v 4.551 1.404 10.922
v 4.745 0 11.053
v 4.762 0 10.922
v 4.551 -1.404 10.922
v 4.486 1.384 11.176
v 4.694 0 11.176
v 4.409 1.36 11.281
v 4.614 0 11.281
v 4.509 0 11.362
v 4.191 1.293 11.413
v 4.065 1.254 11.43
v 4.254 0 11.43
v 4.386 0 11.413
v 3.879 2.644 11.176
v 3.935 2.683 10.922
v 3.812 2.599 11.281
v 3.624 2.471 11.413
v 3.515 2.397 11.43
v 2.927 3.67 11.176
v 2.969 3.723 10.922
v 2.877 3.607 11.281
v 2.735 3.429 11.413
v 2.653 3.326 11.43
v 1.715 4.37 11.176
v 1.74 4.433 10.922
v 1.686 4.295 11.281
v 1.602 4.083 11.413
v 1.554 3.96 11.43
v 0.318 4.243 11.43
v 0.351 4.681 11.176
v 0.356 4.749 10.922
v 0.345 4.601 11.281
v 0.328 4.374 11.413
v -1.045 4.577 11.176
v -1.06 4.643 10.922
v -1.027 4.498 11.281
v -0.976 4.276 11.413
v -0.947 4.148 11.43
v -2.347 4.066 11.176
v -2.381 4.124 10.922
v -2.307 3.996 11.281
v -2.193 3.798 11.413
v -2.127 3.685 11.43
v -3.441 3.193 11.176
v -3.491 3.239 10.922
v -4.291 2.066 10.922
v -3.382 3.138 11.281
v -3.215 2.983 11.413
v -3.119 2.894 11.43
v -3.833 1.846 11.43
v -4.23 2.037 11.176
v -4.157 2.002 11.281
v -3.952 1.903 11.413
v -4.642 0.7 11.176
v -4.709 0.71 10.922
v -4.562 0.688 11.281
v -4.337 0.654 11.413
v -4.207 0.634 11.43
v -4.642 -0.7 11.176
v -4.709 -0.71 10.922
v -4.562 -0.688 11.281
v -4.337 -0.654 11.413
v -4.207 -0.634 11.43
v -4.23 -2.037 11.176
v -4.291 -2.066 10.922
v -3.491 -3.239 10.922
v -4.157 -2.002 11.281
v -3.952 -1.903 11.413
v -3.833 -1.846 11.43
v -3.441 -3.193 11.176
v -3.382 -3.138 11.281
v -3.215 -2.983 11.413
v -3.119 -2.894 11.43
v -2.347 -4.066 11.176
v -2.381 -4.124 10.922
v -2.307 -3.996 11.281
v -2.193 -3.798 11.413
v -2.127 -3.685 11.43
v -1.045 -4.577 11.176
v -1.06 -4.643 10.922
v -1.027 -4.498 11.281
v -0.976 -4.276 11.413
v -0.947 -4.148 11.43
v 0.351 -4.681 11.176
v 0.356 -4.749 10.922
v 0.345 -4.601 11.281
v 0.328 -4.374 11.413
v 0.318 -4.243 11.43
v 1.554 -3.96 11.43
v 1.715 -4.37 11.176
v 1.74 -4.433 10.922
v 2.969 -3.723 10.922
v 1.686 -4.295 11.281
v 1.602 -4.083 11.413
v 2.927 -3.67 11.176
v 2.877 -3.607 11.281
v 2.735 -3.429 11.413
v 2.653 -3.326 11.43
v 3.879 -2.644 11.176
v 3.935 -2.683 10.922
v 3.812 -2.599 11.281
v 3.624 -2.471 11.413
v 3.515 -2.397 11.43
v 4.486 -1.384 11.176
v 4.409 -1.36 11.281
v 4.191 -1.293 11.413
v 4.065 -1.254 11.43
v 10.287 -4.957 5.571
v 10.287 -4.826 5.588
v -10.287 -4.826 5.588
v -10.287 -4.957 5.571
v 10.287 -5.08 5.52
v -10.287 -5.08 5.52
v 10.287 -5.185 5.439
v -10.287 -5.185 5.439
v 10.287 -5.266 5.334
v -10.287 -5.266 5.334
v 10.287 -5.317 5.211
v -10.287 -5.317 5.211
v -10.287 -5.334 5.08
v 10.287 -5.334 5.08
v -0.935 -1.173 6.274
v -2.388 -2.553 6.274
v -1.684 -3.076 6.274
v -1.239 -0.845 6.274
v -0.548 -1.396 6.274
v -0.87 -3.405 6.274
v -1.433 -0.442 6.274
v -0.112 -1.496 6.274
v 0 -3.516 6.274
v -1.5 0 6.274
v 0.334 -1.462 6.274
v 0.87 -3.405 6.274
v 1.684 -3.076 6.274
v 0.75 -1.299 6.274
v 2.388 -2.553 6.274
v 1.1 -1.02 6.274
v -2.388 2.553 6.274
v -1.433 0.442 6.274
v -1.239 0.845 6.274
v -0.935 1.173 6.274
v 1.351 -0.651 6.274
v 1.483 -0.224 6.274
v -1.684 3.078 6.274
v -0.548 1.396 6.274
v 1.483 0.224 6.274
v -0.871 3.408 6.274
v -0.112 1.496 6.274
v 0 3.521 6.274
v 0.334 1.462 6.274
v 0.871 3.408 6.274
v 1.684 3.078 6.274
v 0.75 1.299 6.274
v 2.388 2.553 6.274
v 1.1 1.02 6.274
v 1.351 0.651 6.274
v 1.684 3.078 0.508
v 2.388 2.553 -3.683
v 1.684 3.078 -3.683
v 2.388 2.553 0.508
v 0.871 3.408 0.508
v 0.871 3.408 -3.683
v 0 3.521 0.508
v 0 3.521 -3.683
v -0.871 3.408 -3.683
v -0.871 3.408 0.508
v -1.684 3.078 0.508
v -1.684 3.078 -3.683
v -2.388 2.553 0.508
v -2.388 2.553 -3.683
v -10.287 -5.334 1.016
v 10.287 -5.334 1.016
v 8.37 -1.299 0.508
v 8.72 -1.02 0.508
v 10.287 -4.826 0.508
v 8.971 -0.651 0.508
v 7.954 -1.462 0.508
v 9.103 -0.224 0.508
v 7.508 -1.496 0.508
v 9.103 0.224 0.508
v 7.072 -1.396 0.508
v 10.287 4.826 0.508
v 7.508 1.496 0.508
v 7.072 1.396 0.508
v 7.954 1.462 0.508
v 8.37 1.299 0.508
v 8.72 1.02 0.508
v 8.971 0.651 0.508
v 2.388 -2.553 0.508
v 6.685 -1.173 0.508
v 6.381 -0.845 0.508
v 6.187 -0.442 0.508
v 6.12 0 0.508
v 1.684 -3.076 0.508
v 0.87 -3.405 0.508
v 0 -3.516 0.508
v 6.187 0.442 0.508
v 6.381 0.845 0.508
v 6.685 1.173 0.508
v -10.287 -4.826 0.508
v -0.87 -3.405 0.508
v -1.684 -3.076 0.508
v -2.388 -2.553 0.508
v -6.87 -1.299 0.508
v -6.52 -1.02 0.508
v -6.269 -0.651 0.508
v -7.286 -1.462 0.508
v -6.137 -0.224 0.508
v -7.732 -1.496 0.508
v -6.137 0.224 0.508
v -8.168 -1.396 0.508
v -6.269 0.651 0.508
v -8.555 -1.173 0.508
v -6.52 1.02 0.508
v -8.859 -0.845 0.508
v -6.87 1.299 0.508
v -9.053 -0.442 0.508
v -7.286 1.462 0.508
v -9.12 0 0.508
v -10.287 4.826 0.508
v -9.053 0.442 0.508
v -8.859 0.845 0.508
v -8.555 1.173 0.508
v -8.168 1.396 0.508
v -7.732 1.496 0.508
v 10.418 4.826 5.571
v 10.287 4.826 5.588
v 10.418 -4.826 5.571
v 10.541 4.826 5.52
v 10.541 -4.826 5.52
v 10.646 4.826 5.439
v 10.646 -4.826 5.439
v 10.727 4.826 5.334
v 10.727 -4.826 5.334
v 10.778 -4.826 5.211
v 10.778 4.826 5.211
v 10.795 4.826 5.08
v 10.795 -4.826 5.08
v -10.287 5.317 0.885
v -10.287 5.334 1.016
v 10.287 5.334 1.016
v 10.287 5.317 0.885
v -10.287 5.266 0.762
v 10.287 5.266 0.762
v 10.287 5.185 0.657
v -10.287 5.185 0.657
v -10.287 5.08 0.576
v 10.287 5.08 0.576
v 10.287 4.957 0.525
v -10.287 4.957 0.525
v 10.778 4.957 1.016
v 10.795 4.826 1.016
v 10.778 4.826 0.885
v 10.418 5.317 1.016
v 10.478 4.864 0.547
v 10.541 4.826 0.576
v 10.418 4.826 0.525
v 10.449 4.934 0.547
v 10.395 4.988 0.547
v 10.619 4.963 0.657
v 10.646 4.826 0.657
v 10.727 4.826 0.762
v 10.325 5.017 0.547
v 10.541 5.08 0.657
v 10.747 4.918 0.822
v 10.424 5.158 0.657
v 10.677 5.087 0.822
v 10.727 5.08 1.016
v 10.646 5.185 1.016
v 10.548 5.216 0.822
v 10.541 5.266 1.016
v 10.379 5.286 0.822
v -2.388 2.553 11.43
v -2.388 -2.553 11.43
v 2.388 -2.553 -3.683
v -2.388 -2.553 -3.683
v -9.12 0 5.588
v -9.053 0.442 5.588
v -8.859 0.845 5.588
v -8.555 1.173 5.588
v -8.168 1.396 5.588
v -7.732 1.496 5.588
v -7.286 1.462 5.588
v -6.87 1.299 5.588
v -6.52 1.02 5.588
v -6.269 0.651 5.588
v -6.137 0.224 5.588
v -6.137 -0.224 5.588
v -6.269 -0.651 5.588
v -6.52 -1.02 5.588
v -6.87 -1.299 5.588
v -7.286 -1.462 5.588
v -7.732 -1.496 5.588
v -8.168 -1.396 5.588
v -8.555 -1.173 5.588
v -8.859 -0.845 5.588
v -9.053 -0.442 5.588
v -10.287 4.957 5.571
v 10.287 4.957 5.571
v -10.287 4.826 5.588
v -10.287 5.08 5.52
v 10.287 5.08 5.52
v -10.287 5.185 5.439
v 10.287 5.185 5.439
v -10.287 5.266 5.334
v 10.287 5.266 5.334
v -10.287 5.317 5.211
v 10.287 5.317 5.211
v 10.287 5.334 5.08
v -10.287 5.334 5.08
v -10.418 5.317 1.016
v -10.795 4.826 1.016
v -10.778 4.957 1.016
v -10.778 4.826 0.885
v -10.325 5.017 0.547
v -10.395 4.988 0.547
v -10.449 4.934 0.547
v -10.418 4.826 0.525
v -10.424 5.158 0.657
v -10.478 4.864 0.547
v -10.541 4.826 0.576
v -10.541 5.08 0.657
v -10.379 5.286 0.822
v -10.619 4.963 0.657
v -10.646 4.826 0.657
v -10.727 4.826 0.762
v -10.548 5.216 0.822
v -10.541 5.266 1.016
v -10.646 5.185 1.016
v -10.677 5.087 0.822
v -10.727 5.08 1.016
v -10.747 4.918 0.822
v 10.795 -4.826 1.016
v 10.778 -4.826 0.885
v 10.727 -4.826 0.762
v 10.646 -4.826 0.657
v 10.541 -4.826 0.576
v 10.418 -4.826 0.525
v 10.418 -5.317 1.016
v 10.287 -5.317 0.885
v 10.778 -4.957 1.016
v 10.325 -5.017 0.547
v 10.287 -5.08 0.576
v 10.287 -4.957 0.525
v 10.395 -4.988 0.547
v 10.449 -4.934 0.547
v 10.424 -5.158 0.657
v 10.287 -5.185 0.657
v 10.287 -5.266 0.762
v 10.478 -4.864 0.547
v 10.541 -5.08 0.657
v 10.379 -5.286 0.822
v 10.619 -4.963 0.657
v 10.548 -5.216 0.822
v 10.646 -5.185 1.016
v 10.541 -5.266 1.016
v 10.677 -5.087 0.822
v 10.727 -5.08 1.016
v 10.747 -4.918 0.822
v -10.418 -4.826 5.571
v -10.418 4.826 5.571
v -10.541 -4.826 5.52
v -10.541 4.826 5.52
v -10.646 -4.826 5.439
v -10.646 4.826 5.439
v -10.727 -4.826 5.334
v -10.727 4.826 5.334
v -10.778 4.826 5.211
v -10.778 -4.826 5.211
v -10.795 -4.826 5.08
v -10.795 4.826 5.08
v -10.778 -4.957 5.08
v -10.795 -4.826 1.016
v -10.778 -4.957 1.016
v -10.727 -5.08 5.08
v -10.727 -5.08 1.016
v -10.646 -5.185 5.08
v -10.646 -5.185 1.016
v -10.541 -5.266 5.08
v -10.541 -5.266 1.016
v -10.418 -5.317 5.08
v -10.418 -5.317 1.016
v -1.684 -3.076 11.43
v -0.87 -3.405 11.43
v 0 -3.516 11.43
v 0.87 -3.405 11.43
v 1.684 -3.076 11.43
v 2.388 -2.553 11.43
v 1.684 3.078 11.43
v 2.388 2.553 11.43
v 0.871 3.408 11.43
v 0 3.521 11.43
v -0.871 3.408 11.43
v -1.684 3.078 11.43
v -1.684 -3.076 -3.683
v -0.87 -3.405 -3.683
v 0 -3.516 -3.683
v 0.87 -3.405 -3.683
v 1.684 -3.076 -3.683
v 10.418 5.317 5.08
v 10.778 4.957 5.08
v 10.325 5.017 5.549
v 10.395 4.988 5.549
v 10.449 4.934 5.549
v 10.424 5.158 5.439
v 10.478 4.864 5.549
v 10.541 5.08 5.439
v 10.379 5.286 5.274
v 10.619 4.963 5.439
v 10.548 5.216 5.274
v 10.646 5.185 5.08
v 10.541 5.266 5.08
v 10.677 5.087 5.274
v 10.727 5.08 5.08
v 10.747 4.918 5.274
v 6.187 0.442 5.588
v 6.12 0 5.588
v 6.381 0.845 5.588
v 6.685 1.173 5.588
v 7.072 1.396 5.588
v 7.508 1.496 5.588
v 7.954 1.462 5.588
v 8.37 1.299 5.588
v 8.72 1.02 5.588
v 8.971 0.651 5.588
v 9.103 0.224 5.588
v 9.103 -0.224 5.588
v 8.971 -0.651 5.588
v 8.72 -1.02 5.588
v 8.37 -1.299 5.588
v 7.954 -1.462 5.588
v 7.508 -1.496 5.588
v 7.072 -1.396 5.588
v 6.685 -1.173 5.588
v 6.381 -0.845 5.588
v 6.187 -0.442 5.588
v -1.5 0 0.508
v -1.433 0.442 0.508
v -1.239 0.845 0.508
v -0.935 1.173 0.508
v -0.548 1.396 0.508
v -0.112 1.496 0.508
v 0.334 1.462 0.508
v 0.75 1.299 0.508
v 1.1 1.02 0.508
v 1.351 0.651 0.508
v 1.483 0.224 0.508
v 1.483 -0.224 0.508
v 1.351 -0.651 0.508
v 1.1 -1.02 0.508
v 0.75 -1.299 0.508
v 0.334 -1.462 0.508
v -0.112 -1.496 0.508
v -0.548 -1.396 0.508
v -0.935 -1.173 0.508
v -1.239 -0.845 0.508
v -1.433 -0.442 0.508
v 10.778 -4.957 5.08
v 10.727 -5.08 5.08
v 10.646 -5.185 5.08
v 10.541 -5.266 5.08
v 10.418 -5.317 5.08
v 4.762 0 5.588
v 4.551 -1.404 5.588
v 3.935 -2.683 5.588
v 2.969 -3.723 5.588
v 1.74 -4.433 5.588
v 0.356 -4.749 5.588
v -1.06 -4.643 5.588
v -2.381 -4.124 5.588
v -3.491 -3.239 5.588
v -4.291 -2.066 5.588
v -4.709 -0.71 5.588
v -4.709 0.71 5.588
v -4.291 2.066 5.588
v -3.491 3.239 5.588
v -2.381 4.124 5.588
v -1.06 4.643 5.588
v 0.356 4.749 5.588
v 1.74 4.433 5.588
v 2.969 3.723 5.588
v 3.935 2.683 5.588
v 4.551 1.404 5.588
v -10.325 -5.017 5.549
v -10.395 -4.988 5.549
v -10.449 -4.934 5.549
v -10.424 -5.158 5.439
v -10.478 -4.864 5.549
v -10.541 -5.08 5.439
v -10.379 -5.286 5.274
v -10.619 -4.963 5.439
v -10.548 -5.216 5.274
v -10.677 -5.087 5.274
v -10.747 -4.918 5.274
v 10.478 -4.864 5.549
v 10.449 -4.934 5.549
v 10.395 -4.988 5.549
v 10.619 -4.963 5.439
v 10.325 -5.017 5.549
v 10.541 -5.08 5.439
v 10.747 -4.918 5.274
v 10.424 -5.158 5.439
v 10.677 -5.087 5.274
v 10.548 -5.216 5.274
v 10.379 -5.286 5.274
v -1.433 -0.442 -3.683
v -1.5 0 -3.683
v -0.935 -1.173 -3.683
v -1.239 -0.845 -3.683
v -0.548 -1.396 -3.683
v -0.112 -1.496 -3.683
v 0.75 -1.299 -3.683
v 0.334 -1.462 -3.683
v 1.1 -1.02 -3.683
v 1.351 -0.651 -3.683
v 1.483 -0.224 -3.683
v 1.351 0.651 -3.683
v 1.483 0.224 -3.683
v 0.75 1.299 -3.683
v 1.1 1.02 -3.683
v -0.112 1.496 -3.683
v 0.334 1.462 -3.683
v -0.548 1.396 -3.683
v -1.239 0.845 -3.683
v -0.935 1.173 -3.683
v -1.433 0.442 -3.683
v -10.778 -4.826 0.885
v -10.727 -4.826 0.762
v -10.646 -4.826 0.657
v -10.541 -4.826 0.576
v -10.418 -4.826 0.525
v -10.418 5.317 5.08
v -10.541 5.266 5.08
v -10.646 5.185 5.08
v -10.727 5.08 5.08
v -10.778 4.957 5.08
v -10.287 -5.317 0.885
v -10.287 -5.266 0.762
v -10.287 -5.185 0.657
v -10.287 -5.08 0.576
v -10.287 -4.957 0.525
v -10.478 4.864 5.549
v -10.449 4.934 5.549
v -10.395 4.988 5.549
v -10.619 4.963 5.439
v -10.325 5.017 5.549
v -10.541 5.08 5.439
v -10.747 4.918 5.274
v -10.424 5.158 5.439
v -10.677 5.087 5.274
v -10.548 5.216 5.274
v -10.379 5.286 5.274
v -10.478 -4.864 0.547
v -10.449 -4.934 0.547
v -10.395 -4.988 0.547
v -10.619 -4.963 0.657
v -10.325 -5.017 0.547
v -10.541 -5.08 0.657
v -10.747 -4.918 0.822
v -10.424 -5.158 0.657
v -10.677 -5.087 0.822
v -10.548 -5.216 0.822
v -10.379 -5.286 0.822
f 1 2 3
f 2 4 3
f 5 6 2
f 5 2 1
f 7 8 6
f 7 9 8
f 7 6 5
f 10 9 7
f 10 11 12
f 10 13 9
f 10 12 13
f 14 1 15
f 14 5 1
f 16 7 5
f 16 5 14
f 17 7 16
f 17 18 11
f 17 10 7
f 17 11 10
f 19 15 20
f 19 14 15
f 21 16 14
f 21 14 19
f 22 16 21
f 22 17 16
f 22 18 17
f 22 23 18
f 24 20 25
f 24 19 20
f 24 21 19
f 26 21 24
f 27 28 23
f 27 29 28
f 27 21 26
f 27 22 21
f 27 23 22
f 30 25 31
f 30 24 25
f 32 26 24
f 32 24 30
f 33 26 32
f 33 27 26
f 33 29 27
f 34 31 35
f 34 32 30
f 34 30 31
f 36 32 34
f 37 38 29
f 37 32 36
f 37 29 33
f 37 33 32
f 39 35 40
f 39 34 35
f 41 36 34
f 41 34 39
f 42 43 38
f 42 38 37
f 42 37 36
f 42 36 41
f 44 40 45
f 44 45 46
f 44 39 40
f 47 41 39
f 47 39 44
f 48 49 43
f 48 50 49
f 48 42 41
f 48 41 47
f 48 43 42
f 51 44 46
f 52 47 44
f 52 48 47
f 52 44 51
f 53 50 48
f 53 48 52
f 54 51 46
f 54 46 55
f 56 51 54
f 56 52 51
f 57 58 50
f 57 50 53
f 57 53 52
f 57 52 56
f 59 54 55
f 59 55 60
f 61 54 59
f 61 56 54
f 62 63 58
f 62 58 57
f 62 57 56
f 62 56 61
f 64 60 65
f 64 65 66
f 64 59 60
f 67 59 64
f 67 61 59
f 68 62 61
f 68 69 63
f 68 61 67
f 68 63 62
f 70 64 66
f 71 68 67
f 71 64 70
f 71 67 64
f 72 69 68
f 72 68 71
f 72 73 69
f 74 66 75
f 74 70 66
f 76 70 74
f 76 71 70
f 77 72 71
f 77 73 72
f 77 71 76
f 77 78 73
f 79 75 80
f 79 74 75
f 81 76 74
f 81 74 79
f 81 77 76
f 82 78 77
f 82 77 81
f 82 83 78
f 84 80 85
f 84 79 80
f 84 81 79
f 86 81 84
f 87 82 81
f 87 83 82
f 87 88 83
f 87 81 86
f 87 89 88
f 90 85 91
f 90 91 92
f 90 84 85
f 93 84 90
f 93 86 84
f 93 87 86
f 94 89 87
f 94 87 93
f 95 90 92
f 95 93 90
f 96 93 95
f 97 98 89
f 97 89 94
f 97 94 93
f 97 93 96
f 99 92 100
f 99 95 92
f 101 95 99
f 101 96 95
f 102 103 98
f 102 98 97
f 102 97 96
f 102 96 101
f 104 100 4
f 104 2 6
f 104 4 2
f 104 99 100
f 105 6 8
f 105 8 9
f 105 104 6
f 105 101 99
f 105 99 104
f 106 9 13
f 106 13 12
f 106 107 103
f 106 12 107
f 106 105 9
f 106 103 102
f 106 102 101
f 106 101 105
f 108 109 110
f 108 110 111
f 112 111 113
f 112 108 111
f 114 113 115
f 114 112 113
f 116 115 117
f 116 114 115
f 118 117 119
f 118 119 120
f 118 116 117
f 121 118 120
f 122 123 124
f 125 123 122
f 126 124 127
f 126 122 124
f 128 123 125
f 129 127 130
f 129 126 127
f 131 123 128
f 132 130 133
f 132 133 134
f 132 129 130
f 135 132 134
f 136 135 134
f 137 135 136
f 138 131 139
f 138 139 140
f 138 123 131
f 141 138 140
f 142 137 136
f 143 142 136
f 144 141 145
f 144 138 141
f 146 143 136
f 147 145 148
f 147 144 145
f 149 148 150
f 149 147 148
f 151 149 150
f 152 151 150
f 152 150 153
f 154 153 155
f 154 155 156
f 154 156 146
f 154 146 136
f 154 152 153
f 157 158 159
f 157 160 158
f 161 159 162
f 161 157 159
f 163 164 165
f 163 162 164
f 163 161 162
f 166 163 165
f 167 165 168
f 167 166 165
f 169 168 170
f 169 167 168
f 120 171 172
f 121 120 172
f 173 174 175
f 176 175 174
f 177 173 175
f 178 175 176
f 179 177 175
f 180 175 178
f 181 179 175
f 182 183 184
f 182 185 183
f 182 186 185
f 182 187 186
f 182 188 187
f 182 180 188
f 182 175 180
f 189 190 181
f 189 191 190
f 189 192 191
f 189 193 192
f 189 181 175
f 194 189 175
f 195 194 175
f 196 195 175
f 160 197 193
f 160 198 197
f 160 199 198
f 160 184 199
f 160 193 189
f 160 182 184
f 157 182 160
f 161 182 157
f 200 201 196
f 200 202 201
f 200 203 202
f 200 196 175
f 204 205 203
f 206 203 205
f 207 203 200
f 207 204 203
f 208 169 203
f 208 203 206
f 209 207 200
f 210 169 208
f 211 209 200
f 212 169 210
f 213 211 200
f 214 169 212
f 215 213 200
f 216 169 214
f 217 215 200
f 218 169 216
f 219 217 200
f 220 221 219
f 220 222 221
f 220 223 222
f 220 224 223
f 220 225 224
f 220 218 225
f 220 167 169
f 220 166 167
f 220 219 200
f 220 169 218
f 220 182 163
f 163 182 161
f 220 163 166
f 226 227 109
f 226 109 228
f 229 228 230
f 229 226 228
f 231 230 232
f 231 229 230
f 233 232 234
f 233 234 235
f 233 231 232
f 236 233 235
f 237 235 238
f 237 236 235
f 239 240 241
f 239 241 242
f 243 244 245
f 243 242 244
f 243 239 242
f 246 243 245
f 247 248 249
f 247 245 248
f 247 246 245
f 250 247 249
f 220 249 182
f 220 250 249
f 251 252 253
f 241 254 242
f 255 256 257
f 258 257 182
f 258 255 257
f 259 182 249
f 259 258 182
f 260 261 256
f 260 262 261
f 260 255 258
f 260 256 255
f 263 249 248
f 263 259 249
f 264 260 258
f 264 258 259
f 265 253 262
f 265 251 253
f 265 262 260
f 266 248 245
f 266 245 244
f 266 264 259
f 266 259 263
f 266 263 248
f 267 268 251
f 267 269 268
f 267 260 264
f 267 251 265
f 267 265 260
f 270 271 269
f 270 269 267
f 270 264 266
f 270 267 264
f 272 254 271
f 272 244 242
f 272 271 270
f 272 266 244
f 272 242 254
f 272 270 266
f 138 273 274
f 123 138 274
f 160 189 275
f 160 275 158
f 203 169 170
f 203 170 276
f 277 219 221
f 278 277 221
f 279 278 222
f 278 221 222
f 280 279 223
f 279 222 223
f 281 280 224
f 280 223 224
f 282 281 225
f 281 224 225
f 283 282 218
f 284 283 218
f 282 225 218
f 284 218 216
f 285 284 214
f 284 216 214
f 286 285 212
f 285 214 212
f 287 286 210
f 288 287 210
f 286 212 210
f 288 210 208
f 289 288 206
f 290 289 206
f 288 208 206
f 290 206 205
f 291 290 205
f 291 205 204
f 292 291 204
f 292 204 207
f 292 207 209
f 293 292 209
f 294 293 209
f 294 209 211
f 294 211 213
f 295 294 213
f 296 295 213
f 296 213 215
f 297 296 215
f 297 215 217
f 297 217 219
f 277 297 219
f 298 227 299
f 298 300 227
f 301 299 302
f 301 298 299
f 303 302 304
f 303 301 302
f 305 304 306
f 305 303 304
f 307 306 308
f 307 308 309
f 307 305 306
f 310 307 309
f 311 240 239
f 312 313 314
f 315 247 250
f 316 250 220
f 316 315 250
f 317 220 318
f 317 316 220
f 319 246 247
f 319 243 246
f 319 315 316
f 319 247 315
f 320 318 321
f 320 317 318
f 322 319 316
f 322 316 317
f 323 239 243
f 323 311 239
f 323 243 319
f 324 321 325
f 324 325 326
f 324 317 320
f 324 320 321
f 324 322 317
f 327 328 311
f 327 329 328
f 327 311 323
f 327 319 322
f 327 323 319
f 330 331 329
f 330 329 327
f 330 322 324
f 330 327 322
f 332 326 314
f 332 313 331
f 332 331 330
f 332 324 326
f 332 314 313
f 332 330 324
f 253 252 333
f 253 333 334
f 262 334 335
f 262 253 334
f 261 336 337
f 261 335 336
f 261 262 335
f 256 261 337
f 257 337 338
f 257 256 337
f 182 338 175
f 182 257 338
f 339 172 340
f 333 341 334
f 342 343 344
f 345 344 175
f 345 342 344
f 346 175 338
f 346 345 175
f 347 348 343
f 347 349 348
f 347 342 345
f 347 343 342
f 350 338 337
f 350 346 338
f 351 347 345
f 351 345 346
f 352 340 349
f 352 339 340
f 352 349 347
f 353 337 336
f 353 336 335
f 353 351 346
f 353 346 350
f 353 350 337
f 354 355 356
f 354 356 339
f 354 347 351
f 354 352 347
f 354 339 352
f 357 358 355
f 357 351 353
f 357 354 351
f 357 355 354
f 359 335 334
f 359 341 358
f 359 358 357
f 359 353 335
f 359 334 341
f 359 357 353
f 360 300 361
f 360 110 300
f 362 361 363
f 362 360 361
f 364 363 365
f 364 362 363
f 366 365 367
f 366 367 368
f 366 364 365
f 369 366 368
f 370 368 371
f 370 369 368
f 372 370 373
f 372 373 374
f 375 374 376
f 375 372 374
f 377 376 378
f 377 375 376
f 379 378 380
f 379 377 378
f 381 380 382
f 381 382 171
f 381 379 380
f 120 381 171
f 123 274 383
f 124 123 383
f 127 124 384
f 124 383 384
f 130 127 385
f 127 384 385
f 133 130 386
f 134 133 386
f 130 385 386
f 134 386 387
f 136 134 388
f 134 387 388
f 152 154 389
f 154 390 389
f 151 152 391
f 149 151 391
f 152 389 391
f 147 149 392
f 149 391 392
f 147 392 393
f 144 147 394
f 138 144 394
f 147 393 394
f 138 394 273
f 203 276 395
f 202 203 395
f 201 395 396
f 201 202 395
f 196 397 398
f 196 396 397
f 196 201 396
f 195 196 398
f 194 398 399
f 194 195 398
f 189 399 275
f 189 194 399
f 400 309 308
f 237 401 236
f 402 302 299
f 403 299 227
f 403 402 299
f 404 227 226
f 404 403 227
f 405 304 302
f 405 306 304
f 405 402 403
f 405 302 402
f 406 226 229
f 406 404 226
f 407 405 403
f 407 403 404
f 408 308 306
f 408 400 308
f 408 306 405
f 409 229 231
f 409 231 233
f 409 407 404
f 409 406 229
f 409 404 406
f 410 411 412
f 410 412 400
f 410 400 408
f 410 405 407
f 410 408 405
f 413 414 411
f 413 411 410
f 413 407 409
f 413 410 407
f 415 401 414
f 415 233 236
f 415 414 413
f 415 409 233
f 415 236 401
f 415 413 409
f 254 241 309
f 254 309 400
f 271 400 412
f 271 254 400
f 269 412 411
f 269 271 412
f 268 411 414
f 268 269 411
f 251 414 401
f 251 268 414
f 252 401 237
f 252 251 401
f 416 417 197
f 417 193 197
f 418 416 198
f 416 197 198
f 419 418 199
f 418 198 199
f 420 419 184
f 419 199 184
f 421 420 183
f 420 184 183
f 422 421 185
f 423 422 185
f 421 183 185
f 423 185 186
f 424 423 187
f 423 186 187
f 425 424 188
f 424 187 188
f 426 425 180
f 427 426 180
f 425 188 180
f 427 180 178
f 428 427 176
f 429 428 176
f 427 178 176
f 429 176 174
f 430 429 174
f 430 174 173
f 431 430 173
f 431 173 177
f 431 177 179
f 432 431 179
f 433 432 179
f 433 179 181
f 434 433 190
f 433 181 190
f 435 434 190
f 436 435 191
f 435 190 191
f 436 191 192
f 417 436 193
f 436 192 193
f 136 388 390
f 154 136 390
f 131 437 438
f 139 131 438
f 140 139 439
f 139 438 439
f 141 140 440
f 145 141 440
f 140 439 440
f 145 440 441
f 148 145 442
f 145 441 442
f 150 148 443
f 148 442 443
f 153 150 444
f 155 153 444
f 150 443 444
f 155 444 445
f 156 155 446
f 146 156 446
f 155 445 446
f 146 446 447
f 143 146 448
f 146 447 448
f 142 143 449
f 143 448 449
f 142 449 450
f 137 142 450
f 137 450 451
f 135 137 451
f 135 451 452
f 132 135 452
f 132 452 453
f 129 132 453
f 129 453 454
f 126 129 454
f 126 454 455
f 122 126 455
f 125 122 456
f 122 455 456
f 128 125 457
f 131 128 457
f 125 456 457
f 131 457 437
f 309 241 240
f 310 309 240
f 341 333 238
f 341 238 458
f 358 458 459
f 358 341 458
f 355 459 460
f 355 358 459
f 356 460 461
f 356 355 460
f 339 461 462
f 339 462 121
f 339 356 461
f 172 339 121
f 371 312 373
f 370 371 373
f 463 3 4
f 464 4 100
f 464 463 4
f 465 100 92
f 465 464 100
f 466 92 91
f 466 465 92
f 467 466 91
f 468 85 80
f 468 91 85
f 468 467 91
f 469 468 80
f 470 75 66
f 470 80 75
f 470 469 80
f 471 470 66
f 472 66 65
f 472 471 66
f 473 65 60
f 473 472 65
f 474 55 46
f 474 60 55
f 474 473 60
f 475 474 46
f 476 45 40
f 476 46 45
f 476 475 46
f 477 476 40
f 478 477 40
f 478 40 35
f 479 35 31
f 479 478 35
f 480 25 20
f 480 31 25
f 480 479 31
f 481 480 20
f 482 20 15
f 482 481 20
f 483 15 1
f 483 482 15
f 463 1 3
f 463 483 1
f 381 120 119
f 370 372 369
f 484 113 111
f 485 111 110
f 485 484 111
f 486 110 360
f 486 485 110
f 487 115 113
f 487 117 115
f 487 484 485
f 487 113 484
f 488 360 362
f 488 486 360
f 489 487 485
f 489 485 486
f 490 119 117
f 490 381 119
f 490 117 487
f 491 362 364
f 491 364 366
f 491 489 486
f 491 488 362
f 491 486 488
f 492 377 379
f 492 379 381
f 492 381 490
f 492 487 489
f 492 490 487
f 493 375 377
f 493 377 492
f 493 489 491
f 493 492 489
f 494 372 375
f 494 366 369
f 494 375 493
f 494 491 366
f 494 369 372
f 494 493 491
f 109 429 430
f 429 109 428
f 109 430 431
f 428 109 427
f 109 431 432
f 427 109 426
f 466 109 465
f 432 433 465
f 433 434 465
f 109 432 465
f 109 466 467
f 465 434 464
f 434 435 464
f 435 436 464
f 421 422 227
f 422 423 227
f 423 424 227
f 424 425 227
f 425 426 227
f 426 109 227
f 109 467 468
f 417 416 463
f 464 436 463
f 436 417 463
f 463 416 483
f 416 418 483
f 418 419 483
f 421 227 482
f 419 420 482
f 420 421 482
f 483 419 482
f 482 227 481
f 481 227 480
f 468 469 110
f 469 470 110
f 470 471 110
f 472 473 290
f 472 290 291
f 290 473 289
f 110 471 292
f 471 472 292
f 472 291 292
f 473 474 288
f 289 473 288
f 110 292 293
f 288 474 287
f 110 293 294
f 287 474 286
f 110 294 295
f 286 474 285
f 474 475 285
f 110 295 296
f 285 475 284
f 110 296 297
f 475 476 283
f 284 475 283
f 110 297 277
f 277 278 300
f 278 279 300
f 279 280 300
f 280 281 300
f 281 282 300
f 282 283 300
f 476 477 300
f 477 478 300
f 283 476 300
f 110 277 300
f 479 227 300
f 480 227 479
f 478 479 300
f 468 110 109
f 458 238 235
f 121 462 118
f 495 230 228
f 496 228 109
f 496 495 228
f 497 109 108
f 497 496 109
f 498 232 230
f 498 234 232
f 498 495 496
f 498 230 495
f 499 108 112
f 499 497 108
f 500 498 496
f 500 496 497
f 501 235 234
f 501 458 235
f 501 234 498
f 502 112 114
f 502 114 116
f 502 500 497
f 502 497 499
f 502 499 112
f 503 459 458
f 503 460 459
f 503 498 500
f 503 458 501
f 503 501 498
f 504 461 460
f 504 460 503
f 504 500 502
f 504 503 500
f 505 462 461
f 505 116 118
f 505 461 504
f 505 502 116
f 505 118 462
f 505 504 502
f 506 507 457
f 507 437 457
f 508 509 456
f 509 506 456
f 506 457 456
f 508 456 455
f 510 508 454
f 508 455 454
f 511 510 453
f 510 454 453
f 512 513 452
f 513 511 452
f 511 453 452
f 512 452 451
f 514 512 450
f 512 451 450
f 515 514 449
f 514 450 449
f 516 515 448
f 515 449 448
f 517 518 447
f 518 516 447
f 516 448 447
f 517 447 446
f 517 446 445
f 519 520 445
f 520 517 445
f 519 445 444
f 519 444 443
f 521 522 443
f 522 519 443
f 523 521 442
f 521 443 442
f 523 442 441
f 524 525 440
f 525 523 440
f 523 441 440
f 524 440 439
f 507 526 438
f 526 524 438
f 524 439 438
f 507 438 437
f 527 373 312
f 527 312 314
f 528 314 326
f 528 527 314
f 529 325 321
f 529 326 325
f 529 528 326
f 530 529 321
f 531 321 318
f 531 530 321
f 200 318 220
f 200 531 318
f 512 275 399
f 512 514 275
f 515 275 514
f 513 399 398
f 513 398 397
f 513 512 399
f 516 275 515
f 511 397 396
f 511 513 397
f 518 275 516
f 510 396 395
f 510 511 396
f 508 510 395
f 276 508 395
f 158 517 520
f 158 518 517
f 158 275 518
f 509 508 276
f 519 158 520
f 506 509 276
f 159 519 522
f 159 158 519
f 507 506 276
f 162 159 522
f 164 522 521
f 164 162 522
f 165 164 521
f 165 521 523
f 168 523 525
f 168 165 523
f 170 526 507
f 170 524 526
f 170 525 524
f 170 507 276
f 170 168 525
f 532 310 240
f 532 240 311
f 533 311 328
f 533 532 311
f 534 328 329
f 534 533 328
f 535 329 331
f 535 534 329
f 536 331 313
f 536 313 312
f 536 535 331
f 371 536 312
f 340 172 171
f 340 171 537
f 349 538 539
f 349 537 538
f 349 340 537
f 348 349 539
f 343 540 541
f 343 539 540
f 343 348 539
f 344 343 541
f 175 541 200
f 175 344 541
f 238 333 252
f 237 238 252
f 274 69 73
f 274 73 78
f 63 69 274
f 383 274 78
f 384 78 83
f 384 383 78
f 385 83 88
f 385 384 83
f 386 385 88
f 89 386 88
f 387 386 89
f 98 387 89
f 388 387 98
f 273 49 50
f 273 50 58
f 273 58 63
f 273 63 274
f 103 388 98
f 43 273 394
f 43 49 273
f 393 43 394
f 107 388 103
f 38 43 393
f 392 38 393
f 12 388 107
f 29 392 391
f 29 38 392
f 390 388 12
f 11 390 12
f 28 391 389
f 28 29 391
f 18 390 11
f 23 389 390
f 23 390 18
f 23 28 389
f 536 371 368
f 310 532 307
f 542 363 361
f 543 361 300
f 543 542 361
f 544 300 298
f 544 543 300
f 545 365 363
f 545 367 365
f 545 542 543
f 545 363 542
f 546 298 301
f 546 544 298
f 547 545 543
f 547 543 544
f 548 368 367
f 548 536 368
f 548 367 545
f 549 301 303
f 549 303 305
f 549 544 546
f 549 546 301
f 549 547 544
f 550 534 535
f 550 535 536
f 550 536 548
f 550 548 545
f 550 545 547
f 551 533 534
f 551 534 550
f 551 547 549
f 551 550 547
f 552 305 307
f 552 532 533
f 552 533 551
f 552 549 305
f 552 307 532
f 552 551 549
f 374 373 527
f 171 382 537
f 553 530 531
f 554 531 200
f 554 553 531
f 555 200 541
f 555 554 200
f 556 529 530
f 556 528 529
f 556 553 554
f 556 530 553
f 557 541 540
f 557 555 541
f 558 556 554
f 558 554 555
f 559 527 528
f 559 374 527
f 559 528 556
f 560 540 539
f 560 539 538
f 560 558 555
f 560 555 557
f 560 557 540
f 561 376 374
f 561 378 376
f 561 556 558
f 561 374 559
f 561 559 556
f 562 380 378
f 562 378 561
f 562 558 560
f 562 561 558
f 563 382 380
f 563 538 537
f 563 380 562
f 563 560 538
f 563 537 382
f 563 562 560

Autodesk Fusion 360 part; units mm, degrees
sketch "Sketch1" plane through (0, 0, 0) normal (0, 0, 1) x (1, 0, 0)
  circle A0 centre (0, 0) radius 4.7625
  dimension "d1" = 9.525
extrude "Extrude1" add sketch "Sketch1" along normal blind 11.43 makes body 1
sketch "Sketch2" plane through (0, 0, 11.43) normal (0, 0, 1) x (1, 0, 0)
  circle A0 centre (0, 0) radius 4.7625
  line L0 (-2.3876, 2.5527) -> (-2.3876, -2.5527)
  line L1 (2.3876, -2.5527) -> (2.3876, 2.5527)
  line L2 (2.3876, 2.5527) -> (-2.3876, -2.5527) construction
  line L3 (-2.3876, 2.5527) -> (2.3876, -2.5527) construction
  arc A1 (2.3876, 2.5527) -> (-2.3876, 2.5527) centre (0, 0.0915) ccw
  arc A2 (-2.3876, -2.5527) -> (2.3876, -2.5527) centre (0, -0.0771) ccw
  dimension "d4" = 5.1054
  dimension "d5" = 4.7752
  dimension "d6" = 3.429
  dimension "d7" = 3.4394
extrude "Extrude2" cut sketch "Sketch2" against normal blind 5.1562 contours L0 L1 A1 A2 bodies 1
extrude "Extrude3" cut 1 faces at (0.58, -0.1002, 0) along direction (0, 0, 1) blind 3.048 on bodies 1 bodies 1
sketch "Sketch3" plane through (0, 0, 3.048) normal (0, 0, -1) x (-1, 0, 0)
  circle A0 centre (0, 0) radius 4.7625
  line L0 (-10.795, 5.334) -> (10.795, 5.334)
  line L1 (10.795, 5.334) -> (10.795, -5.334)
  line L2 (10.795, -5.334) -> (-10.795, -5.334)
  line L3 (-10.795, -5.334) -> (-10.795, 5.334)
  line L4 (-10.795, 5.334) -> (10.795, -5.334) construction
  line L5 (10.795, 5.334) -> (-10.795, -5.334) construction
  dimension "d12" = 21.59
  dimension "d13" = 10.668
extrude "Extrude5" add sketch "Sketch3" against normal blind 2.54 bodies 1
extrude "Extrude4" add sketch "Sketch3" along normal blind 2.54 contours A0 | L0 L1 L2 L3 bodies 1
sketch "Sketch4" plane through (0, 0, 0.508) normal (0, 0, -1) x (-1, 0, 0)
  line L0 (-10.795, -5.334) -> (10.795, -5.334)
  line L1 (10.795, -5.334) -> (10.795, 5.334)
  line L2 (10.795, 5.334) -> (-10.795, 5.334)
  line L3 (-10.795, 5.334) -> (-10.795, -5.334)
  circle A0 centre (0, 0) radius 1.5
  circle A1 centre (-7.62, 0) radius 1.5
  circle A2 centre (7.62, 0) radius 1.5
  dimension "d18" = 3
  dimension "d19" = 3
  dimension "d20" = 3
extrude "Extrude6" cut sketch "Sketch4" against normal blind 13.97 contours A0 | A1 | A2 bodies 1
sketch "Sketch5" plane through (0, 0, 0.508) normal (0, 0, -1) x (-1, 0, 0)
  circle A0 centre (-7.62, 0) radius 1.5
  circle A1 centre (0, 0) radius 1.5
  circle A2 centre (7.62, 0) radius 1.5
  line L0 (-10.795, -5.334) -> (10.795, -5.334)
  line L1 (10.795, -5.334) -> (10.795, 5.334)
  line L2 (10.795, 5.334) -> (-10.795, 5.334)
  line L3 (-10.795, 5.334) -> (-10.795, -5.334)
  line L4 (-2.3876, -2.5527) -> (-2.3876, 2.5527)
  line L5 (-2.3876, 2.5527) -> (-2.3876, -2.5527)
  line L6 (2.3876, 2.5527) -> (2.3876, -2.5527)
  arc A3 (2.3876, 2.5527) -> (-2.3876, 2.5527) centre (0, 0.0915) ccw
  arc A4 (-2.3876, -2.5527) -> (2.3876, -2.5527) centre (0, -0.0771) ccw
extrude "Extrude7" add sketch "Sketch5" along normal blind 4.191 contours L4 L5 L6 A3 A4 bodies 1
fillet "Fillet1" radius 0.508 13 edges at (-10.795, -5.334, 3.048) (-10.795, 5.334, 3.048) (10.795, 5.334, 3.048) (10.795, -5.334, 3.048) (10.795, 0, 5.588) (10.795, 0, 0.508) (0, 5.334, 0.508) (0, 5.334, 5.588) (-10.795, 0, 5.588) (-10.795, 0, 0.508) (0, -5.334, 5.588) (0, -5.334, 0.508) (-4.4402, -1.7222, 11.43) on bodies 1
sketch "Sketch6" plane through (0, 0, 0.508) normal (0, 0, -1) x (-1, 0, 0)
  circle A0 centre (7.62, 0) radius 1.5
  circle A1 centre (-7.62, 0) radius 1.5
  line L0 (2.3876, 2.5527) -> (2.3876, -2.5527)
  arc A2 (-2.3876, -2.5527) -> (2.3876, -2.5527) centre (0, -0.0771) ccw
  line L1 (-2.3876, -2.5527) -> (-2.3876, 2.5527)
  arc A3 (2.3876, 2.5527) -> (-2.3876, 2.5527) centre (0, 0.0915) ccw
  line L2 (10.287, -4.826) -> (10.287, 4.826)
  line L3 (10.287, 4.826) -> (-10.287, 4.826)
  line L4 (-10.287, 4.826) -> (-10.287, -4.826)
  line L5 (-10.287, -4.826) -> (10.287, -4.826)
  circle A4 centre (0, 0.0915) radius 17.2202
  circle A5 centre (-7.62, 0) radius 1.5
  line L6 (-2.3876, 2.5527) -> (-2.3876, -2.5527)
  arc A6 (2.3876, 2.5527) -> (-2.3876, 2.5527) centre (0, 0.0915) ccw
  line L7 (2.3876, -2.5527) -> (2.3876, 2.5527)
  arc A7 (-2.3876, -2.5527) -> (2.3876, -2.5527) centre (0, -0.0771) ccw
  circle A8 centre (7.62, 0) radius 1.5
extrude "Extrude8" add sketch "Sketch6" along normal blind 3.81 separate body contours L2 L3 L4 L5 | A4 makes body 2
hidden bodies 2
